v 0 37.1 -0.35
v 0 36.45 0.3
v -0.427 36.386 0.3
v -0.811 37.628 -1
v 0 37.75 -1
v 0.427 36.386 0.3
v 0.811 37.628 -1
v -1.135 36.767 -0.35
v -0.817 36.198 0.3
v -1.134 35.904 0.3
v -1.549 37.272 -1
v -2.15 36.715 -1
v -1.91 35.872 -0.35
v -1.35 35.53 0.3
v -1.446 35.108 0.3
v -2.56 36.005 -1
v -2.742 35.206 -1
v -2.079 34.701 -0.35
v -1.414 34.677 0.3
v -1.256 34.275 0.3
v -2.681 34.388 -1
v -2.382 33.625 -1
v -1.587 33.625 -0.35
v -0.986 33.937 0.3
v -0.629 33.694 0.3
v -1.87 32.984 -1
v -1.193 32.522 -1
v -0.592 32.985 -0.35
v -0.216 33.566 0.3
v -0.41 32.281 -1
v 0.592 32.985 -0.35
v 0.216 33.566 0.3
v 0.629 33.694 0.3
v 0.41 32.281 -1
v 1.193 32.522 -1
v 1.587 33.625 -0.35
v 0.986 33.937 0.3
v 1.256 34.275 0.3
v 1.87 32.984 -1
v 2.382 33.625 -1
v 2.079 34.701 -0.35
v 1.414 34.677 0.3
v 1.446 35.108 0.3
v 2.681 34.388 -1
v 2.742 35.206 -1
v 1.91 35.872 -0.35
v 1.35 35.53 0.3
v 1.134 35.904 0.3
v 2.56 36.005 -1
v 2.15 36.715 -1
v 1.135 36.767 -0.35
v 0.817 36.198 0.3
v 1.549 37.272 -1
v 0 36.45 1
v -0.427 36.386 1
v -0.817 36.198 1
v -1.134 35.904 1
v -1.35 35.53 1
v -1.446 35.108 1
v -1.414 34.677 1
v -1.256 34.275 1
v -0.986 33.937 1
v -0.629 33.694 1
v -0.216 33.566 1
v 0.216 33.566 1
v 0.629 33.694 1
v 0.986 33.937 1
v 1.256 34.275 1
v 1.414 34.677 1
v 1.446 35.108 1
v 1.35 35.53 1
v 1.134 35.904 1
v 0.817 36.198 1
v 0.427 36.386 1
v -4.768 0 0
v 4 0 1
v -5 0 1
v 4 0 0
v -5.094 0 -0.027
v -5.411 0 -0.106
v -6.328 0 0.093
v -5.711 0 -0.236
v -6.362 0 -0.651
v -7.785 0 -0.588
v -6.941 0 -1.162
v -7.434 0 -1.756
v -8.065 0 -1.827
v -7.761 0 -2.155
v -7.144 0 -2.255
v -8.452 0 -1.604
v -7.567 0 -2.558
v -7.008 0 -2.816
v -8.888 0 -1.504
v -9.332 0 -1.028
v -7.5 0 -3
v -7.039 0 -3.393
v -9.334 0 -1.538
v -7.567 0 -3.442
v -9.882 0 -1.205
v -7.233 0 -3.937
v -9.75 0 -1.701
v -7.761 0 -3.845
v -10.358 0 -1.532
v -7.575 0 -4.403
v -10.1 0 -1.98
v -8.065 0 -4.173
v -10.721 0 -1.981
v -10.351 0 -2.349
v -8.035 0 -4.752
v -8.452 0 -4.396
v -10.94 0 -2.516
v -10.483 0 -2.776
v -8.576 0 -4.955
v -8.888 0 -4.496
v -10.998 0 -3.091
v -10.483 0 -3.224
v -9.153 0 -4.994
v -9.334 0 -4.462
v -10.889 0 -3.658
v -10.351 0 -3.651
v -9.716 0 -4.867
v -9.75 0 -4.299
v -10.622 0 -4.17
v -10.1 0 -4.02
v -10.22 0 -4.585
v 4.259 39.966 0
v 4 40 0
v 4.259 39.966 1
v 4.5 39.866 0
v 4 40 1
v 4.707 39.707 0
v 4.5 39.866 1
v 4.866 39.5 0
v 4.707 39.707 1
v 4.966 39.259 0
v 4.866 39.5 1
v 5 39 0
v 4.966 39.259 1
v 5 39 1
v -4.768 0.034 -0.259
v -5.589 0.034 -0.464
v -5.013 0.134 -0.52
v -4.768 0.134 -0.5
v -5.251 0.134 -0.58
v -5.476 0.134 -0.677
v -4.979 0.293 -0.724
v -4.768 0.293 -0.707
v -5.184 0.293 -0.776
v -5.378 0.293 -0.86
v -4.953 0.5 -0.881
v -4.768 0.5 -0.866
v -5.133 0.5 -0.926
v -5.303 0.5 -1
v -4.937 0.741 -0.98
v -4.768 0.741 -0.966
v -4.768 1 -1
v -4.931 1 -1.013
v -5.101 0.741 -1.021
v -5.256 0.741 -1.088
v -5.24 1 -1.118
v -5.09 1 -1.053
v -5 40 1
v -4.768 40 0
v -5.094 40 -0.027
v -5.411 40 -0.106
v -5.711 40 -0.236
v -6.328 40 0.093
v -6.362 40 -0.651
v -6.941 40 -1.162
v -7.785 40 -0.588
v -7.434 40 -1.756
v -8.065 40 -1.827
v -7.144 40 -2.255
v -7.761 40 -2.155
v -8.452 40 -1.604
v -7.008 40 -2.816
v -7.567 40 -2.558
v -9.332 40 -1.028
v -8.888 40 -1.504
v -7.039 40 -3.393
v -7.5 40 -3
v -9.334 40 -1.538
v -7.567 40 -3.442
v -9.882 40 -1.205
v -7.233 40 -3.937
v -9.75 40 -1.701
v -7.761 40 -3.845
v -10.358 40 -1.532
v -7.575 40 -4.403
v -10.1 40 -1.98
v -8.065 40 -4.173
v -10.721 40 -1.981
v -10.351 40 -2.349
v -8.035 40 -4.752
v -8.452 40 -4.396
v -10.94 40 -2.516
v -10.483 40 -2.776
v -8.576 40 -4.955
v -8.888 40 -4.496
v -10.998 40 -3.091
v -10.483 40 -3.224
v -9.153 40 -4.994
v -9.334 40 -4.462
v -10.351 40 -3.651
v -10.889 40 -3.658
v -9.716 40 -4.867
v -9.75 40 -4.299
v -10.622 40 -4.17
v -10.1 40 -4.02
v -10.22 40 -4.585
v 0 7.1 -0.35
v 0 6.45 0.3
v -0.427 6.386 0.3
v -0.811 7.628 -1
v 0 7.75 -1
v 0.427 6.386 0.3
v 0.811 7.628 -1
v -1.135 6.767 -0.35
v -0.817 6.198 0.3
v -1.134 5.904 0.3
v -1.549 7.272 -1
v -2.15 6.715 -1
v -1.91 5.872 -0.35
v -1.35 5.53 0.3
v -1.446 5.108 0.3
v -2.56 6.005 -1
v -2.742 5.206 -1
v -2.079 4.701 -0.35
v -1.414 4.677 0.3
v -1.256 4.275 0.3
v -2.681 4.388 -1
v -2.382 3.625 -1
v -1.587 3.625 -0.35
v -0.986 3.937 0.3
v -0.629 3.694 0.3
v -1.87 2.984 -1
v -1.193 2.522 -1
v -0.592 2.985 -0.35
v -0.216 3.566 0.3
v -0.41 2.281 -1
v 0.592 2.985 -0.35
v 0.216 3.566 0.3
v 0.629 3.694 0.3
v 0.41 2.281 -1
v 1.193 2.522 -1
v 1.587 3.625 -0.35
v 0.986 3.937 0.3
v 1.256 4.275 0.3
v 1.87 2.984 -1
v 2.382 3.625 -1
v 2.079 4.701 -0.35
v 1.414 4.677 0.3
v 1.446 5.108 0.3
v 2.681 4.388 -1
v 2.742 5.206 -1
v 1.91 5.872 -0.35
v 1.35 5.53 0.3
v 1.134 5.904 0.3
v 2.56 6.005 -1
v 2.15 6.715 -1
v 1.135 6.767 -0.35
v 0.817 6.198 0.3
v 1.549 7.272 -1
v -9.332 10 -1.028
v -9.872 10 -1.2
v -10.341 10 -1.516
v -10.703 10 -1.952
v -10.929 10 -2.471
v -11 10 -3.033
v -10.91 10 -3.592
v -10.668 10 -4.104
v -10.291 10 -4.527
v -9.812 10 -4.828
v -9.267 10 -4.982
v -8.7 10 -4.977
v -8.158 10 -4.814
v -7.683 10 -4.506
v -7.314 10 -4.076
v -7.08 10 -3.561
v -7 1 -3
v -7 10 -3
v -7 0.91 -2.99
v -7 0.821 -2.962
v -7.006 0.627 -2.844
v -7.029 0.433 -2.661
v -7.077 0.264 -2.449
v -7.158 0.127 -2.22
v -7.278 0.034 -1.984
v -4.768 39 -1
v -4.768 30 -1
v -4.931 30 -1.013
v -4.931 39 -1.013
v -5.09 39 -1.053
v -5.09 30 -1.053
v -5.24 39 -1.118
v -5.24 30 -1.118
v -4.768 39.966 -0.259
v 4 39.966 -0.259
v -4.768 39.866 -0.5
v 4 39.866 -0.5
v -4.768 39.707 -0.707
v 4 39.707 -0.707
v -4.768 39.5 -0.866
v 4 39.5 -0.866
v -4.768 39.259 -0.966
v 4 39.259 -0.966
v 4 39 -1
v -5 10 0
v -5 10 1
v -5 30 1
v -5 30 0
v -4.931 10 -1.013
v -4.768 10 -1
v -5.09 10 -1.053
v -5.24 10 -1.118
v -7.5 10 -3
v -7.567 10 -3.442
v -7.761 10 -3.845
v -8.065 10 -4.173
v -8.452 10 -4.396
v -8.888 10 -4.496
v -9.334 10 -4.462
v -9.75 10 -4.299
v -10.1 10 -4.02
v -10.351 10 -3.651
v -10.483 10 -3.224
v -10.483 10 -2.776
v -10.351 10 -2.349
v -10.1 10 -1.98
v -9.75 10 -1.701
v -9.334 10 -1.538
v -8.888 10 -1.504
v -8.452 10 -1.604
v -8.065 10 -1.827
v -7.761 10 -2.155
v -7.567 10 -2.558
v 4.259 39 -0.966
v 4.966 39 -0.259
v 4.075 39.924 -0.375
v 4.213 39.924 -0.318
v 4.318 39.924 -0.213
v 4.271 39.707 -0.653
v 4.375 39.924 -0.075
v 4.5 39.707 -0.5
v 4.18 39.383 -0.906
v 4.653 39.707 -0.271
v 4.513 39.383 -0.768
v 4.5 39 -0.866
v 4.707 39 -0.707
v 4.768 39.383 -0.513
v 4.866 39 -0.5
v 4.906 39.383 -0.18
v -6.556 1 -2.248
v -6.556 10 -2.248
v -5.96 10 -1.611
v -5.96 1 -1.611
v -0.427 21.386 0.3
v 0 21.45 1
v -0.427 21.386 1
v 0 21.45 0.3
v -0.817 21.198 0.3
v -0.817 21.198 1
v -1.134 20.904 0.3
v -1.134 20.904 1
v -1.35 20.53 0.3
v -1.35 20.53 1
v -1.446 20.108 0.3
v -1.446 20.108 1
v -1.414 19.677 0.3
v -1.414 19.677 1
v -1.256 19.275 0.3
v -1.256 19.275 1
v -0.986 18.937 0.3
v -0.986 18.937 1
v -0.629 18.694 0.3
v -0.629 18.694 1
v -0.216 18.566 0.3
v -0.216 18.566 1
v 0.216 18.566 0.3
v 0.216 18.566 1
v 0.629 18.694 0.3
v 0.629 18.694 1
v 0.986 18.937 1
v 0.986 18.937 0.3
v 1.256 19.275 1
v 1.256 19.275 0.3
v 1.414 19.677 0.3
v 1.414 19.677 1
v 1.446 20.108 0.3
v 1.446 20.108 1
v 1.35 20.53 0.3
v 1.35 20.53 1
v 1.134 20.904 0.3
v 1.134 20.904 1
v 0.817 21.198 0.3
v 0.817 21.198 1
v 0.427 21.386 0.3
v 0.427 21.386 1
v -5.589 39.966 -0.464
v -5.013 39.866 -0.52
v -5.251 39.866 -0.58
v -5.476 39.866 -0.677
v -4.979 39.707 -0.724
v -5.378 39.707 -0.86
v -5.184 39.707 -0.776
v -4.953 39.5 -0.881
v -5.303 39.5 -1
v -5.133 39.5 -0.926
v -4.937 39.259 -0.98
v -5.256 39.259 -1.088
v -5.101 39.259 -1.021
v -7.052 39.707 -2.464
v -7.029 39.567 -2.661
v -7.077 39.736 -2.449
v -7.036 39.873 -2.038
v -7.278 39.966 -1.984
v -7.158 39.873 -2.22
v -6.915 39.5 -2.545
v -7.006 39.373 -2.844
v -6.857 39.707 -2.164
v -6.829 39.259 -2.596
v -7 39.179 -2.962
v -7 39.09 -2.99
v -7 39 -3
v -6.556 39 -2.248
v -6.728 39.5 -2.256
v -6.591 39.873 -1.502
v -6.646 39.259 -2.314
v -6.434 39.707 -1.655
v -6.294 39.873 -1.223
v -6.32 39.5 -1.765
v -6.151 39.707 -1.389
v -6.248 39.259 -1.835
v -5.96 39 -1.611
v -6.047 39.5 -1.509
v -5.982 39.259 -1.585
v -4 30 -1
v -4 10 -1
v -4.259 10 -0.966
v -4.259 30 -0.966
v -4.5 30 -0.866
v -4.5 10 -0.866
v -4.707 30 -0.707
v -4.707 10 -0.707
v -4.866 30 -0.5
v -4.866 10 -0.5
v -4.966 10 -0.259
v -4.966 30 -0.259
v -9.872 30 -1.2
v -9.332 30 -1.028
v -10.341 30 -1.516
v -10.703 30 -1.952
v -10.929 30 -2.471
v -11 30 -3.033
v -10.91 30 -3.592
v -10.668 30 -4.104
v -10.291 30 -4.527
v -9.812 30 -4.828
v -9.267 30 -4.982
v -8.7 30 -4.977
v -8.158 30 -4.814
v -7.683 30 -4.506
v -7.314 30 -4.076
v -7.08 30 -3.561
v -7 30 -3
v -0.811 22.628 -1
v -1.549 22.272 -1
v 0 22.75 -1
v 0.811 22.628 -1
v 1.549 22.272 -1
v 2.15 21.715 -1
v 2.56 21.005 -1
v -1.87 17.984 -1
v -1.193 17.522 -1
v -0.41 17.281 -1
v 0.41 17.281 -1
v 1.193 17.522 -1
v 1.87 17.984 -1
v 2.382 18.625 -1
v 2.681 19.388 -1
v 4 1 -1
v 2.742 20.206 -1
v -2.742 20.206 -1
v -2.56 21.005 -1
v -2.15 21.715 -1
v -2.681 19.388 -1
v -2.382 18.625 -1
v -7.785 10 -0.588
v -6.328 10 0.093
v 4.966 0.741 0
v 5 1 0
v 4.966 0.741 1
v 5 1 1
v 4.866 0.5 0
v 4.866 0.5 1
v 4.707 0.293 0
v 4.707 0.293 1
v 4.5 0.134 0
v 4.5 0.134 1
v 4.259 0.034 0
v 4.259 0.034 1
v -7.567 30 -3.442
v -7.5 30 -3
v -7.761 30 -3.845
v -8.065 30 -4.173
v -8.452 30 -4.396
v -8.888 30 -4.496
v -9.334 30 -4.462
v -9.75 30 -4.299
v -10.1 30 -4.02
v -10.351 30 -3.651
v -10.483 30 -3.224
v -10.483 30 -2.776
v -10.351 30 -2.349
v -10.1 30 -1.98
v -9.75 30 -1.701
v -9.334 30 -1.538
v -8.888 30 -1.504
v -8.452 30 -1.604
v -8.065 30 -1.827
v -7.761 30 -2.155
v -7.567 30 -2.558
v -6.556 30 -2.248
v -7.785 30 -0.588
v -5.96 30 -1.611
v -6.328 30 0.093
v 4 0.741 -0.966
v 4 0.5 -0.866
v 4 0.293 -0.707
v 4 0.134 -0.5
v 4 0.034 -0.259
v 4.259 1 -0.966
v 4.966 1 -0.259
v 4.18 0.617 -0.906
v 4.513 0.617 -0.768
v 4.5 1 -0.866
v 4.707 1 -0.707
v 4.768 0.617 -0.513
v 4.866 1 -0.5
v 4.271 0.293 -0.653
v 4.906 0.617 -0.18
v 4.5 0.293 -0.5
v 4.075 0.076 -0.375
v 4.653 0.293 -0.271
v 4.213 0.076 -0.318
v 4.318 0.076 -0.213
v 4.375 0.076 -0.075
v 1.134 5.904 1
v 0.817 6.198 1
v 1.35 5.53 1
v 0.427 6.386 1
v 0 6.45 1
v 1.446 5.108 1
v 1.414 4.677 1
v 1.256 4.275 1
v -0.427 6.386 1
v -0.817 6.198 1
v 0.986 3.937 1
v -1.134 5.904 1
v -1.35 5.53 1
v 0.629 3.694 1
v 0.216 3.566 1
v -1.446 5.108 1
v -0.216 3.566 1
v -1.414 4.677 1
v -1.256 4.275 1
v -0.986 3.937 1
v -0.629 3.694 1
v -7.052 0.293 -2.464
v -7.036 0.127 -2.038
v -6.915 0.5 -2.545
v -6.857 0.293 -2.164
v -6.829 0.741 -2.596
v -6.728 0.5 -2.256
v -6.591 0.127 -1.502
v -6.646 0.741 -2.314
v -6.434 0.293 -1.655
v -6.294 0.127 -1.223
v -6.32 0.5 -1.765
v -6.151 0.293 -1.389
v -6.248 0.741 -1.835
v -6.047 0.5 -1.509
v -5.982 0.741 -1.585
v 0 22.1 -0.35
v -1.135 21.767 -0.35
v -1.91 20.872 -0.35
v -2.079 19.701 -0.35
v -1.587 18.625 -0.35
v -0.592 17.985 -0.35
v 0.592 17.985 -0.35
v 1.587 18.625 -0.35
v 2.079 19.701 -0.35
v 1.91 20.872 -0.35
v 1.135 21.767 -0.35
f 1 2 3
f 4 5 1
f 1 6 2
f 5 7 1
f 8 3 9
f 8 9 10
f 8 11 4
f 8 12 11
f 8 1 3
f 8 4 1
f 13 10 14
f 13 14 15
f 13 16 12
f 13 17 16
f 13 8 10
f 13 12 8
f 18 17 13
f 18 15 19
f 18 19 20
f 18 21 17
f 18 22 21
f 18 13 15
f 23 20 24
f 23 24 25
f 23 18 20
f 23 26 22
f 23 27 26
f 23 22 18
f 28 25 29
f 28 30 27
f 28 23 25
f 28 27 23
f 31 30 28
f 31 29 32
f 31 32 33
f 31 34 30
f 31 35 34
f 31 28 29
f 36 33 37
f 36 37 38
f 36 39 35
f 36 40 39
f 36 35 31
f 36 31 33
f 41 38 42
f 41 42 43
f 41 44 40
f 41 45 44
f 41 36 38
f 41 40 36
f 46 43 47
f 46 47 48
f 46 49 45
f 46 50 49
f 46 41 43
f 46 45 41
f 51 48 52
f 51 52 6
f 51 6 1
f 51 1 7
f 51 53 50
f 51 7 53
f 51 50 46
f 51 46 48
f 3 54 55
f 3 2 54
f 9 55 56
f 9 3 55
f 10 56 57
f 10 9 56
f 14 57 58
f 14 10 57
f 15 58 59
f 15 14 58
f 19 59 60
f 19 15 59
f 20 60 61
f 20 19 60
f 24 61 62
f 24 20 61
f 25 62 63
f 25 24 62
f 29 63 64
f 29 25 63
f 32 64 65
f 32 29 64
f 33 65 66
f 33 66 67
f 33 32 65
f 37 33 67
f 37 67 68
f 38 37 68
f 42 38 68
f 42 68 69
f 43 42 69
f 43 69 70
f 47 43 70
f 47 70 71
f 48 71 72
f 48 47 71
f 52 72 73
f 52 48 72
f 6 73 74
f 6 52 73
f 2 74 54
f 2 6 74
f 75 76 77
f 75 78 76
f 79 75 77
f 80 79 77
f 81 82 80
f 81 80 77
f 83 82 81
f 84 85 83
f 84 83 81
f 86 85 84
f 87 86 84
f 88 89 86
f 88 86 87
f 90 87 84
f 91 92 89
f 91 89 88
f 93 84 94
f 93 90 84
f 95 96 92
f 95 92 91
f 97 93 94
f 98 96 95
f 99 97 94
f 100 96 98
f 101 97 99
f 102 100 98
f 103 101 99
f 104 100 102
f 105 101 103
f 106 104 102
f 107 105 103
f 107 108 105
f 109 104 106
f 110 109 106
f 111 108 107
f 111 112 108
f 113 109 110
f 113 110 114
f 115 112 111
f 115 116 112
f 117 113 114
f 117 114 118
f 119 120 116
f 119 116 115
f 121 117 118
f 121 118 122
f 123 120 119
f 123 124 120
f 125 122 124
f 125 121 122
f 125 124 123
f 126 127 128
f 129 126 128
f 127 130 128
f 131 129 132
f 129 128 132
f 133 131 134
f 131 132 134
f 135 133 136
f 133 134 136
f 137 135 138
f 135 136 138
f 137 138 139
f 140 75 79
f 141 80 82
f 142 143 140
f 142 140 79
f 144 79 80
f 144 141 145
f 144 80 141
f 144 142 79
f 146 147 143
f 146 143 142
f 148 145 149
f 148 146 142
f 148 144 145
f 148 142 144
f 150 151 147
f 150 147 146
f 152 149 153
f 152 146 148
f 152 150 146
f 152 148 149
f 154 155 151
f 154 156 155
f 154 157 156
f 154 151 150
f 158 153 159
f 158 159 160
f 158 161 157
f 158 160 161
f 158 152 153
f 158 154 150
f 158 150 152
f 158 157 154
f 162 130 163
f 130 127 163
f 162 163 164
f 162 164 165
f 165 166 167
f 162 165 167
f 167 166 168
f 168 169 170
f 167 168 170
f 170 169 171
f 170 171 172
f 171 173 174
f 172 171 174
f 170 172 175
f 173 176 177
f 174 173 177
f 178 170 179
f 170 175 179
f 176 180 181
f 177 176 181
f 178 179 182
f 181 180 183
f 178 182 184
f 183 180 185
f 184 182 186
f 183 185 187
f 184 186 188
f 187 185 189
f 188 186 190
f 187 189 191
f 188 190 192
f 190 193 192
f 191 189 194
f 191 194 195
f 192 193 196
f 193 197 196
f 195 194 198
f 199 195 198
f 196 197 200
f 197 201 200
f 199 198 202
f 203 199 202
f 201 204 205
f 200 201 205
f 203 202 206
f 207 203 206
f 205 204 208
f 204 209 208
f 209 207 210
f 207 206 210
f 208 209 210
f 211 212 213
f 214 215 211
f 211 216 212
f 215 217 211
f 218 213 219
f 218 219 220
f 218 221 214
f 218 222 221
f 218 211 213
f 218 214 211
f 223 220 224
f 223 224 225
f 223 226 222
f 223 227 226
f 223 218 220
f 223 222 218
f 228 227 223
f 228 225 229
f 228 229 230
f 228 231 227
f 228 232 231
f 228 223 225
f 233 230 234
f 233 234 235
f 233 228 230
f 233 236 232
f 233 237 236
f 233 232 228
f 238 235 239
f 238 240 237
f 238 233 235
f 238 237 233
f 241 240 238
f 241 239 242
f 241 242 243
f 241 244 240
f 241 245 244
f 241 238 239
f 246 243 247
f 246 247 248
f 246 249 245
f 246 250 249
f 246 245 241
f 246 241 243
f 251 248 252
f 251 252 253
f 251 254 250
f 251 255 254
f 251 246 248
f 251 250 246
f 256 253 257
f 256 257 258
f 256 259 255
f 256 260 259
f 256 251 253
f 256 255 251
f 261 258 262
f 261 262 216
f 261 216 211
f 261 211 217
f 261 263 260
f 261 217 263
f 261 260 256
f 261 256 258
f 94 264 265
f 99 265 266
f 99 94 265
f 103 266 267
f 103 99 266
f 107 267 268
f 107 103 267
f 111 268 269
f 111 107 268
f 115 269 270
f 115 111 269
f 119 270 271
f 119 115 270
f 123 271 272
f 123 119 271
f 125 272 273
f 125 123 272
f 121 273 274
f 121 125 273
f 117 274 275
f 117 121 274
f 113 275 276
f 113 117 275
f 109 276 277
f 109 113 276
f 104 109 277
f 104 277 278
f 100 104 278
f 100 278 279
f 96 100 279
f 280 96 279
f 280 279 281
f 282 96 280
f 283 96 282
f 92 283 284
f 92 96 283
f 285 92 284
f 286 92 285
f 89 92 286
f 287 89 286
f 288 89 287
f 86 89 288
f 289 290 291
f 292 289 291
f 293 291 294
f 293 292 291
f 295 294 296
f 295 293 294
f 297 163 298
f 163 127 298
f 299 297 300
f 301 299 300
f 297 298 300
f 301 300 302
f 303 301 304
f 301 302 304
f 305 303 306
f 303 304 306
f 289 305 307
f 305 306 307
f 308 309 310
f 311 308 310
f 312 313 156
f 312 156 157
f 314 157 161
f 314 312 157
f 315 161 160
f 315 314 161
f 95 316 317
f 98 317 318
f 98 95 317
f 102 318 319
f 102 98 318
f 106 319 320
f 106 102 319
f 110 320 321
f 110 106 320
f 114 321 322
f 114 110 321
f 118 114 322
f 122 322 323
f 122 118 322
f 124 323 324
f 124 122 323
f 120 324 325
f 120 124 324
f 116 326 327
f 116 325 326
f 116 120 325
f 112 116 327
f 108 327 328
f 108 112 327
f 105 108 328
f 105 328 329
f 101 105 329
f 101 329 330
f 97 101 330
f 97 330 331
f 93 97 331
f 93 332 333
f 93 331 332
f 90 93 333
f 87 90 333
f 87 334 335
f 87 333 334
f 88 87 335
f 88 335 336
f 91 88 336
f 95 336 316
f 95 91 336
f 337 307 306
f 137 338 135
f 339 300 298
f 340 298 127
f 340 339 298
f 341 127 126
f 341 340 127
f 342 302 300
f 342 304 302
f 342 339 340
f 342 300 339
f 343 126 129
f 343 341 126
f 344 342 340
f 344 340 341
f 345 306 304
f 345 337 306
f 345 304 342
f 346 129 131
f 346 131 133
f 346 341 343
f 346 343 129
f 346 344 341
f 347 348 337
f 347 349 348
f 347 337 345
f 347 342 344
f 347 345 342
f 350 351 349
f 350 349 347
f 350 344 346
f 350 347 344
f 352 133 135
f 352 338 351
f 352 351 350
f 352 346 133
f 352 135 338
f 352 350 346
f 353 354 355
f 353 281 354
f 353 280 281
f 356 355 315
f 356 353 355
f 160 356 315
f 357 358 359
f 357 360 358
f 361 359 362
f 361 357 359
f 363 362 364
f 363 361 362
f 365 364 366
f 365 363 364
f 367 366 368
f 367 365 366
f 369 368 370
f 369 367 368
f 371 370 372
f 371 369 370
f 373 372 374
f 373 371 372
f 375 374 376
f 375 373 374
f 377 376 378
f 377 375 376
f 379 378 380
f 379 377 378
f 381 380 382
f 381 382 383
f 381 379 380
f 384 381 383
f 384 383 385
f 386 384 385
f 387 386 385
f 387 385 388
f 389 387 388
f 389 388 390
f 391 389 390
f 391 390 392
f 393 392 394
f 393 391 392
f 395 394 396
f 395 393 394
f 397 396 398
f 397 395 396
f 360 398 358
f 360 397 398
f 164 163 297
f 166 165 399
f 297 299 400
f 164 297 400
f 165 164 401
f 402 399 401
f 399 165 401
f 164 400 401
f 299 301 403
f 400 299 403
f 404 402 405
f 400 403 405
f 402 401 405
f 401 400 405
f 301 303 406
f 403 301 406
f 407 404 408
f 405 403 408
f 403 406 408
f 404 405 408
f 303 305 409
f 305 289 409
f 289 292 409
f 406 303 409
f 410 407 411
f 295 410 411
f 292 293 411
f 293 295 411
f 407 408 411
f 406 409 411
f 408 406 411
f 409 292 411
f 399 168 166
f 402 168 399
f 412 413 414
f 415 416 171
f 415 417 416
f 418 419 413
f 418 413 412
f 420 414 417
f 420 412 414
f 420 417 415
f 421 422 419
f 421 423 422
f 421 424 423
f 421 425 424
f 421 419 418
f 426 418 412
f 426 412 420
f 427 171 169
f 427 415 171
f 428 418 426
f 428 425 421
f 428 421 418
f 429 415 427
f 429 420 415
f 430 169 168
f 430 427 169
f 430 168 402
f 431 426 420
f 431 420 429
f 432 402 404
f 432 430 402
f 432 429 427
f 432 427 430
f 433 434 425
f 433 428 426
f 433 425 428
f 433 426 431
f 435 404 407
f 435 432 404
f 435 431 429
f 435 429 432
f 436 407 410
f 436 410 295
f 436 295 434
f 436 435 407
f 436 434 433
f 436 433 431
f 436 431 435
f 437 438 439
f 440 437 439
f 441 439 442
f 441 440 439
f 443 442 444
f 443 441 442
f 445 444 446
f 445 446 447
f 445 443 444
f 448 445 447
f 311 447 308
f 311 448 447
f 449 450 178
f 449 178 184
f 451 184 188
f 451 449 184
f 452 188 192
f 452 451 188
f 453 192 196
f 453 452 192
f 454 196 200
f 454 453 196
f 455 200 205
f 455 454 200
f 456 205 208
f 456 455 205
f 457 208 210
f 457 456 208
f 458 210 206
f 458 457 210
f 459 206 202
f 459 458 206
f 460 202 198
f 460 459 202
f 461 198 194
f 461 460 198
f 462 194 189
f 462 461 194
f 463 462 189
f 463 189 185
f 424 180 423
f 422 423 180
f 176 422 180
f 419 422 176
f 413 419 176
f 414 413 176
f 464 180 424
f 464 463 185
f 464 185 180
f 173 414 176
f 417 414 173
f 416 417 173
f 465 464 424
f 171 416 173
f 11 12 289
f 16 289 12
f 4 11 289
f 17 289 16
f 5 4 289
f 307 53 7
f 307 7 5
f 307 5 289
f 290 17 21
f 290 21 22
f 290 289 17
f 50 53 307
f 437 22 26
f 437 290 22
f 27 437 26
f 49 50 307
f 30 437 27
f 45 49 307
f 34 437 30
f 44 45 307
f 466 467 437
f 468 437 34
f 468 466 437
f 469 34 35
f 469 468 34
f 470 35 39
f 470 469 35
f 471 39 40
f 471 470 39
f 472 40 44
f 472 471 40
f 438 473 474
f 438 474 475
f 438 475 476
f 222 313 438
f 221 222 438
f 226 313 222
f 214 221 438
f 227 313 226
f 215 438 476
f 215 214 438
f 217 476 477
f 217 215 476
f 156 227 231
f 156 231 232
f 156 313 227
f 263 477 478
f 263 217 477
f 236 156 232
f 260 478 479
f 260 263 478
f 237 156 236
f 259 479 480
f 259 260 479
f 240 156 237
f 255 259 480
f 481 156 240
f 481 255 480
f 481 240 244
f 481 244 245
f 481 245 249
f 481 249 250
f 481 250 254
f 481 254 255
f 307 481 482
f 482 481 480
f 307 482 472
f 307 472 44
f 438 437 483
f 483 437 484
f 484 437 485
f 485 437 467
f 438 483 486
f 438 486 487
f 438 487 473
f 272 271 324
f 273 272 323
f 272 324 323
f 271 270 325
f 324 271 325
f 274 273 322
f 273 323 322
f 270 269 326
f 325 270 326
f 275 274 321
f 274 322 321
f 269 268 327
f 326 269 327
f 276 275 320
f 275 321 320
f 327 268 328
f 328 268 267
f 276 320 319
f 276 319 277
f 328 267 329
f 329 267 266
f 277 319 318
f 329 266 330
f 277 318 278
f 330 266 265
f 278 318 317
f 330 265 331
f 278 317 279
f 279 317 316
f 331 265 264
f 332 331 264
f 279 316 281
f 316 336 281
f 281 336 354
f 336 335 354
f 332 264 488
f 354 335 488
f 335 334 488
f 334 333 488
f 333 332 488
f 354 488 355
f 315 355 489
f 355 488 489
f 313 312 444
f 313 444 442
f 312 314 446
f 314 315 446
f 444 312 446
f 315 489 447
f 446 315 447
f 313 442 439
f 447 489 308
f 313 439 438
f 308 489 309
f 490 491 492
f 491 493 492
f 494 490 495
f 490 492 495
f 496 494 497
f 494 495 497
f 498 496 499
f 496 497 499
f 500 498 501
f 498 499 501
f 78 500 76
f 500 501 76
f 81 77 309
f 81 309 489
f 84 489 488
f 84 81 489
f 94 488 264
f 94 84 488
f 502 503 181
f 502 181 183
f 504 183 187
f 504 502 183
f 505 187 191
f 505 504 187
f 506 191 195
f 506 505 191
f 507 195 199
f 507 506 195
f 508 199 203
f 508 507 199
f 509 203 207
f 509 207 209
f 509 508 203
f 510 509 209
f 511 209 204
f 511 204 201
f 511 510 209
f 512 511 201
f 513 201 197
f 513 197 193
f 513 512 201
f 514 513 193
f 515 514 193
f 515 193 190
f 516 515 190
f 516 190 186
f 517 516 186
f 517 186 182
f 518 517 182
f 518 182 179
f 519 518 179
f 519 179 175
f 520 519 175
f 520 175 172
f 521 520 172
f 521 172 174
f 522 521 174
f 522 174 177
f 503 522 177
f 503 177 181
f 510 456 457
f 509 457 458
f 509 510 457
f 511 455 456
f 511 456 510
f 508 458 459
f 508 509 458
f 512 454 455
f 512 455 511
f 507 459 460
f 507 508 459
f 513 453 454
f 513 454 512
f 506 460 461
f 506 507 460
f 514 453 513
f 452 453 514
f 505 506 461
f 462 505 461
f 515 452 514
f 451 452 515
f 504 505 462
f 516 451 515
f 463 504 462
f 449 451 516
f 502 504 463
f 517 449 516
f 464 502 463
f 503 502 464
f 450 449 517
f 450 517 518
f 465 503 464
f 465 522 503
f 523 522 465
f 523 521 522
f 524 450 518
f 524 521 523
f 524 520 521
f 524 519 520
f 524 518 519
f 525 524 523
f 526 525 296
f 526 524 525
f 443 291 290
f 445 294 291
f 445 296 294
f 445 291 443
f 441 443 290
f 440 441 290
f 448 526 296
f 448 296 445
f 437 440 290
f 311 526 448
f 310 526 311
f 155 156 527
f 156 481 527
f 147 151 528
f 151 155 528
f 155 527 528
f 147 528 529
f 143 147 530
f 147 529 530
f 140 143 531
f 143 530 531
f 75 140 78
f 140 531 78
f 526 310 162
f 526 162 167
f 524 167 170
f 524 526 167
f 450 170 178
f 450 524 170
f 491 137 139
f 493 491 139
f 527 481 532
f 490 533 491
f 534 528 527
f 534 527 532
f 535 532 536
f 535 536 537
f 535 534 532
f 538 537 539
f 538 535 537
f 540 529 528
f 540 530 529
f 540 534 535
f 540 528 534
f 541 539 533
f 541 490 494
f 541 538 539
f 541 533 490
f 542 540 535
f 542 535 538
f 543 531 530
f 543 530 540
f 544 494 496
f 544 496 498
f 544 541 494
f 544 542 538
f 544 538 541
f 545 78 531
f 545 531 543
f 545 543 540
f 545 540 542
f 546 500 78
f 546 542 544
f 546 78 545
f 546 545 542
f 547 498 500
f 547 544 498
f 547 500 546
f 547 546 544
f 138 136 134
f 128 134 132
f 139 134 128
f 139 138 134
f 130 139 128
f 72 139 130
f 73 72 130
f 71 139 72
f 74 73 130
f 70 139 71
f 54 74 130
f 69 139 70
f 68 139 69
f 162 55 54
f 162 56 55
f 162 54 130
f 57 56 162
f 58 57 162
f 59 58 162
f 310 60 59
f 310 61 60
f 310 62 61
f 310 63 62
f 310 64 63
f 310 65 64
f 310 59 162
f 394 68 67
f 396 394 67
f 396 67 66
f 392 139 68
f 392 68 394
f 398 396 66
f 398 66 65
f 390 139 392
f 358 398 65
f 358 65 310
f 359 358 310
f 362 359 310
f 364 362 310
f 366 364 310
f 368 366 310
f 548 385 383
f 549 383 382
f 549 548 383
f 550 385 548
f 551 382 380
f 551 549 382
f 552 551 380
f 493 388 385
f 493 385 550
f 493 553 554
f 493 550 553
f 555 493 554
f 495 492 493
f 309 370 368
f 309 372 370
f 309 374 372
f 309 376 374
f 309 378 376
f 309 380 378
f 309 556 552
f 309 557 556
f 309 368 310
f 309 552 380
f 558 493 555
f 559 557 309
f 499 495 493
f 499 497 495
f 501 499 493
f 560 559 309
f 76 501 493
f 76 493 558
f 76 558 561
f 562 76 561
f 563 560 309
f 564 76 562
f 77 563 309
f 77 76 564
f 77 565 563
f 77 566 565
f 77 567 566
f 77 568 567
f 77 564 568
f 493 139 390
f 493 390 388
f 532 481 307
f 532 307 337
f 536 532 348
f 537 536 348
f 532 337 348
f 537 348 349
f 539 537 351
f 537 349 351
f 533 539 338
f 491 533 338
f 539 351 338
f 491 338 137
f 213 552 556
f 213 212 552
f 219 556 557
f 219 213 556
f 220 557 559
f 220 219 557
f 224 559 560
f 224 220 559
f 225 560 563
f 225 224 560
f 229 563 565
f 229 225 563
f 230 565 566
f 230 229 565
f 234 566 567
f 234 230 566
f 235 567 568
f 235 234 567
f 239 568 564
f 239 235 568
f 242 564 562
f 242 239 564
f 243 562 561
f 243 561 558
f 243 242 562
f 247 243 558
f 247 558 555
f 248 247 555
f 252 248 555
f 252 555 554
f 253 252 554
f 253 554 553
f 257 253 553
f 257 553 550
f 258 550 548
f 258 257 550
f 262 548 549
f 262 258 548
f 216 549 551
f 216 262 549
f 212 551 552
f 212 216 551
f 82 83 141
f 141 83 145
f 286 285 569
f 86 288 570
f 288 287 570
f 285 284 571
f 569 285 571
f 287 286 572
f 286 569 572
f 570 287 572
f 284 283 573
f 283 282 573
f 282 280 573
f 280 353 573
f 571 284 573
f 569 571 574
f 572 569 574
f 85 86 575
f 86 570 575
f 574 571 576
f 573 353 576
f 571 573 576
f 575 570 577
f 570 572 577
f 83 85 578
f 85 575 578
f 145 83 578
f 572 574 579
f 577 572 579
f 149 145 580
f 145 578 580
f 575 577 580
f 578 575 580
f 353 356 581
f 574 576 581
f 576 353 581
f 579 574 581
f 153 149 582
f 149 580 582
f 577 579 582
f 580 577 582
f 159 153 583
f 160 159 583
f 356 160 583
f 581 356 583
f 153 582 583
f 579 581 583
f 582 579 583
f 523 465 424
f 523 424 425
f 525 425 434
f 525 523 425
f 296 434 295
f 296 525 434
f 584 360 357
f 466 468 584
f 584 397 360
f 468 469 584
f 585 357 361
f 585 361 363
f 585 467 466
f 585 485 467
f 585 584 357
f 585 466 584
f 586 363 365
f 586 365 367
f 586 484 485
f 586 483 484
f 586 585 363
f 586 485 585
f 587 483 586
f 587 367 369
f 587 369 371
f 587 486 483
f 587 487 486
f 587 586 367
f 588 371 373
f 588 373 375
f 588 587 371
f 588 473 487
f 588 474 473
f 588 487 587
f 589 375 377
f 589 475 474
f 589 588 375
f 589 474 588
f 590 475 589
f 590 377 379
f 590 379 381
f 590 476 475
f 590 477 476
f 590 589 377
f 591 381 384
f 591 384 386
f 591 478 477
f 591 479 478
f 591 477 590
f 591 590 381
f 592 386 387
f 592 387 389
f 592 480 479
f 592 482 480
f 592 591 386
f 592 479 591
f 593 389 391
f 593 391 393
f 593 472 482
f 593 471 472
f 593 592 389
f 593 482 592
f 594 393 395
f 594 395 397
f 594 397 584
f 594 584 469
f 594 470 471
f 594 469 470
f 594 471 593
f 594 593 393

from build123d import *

# Parameters (mm, degrees)
SKETCH3_R                                    = 1.5
BOSS_EXTRUDE2_DEPTH                          = 40
SKETCH4_W                                    = 6
SKETCH4_H                                    = 20
CUT_EXTRUDE1_DEPTH                           = 40
CUT_EXTRUDE1_DEPTH_BACK                      = 200
FILLET1_R                                    = 1
FILLET2_R                                    = 1
CSK_FOR_M2_5_COUNTERSUNK_FLAT_HEAD_S_2_COUNT = 2
CSK_FOR_M2_5_COUNTERSUNK_FLAT_HEAD_S_2_PITCH = 15
CSK_FOR_M2_5_COUNTERSUNK_FLAT_HEAD_S_3_COUNT = 2
CSK_FOR_M2_5_COUNTERSUNK_FLAT_HEAD_S_3_PITCH = 30


with BuildPart() as part:
    # Sketch3 → Boss-Extrude2 (new body)
    with BuildSketch(Plane(origin=(0, 0, 0), x_dir=(1, 0, 0), z_dir=(0, 1, 0))):
        with BuildLine():
            Line((-5, 1), (5, 1))
            Line((5, 1), (5, -1))
            Line((5, -1), (-5, -1))
            ThreePointArc((-5, -1), (-7.043086083, 0.276738431), (-9.332231573, 1.027787491))
            ThreePointArc((-9.332231573, 1.027787491), (-10.291421088, 4.527164553), (-7, 3))
            ThreePointArc((-7, 3), (-6.182675814, 1.817324186), (-5, 1))
        make_face()
        with Locations((-9, 3)):
            Circle(SKETCH3_R, mode=Mode.SUBTRACT)
    extrude(amount=BOSS_EXTRUDE2_DEPTH)

    # Sketch4 → Cut-Extrude1 (cut, two sides)
    with BuildSketch(Plane.XY) as cut_extrude1_sk:
        with Locations((-8, 20)):
            Rectangle(SKETCH4_W, SKETCH4_H)
    extrude(amount=CUT_EXTRUDE1_DEPTH, mode=Mode.SUBTRACT)
    extrude(cut_extrude1_sk.sketch, amount=-CUT_EXTRUDE1_DEPTH_BACK, mode=Mode.SUBTRACT)

    # Fillet1
    fillet1_edges = [part.edges().sort_by_distance(p)[0] for p in [
        (5, 20, -1),
        (-5, 20, -1),
    ]]
    fillet(fillet1_edges, radius=FILLET1_R)

    # Fillet2
    fillet2_edges = [part.edges().sort_by_distance(p)[0] for p in [
        (-6.182675814, 40, -1.817324186),
        (-5, 35, -1),
        (-5, 5, -1),
        (5, 40, 0.5),
        (-0.5, 0, -1),
        (-0.5, 40, -1),
        (4.707106781, 0, -0.707106781),
        (4.707106781, 40, -0.707106781),
        (-6.182675814, 0, -1.817324186),
        (5, 0, 0.5),
    ]]
    fillet(fillet2_edges, radius=FILLET2_R)

    # Sketch6 → CSK for M2.5 Countersunk Flat Head Screw1 (revolve, cut)
    with BuildSketch(Plane(origin=(0, 35, -1), x_dir=(0, 1, 0), z_dir=(1, 0, 0))):
        Polygon((0, 0), (0, 2), (1.45, 2), (1.45, 1.3), (2.75, 0), align=None)
    csk_for_m2_5_countersunk_flat_head_screw = revolve(axis=Axis((0, 35, -7.35), (0, 0, 1)), mode=Mode.SUBTRACT)

    # CSK for M2.5 Countersunk Flat Head S 2: CSK for M2.5 Countersunk Flat Head Screw1 ×2
    with Locations(*[(0, -i * CSK_FOR_M2_5_COUNTERSUNK_FLAT_HEAD_S_2_PITCH, 0) for i in range(1, CSK_FOR_M2_5_COUNTERSUNK_FLAT_HEAD_S_2_COUNT)]):
        add(csk_for_m2_5_countersunk_flat_head_screw, mode=Mode.SUBTRACT)

    # CSK for M2.5 Countersunk Flat Head S 3: CSK for M2.5 Countersunk Flat Head Screw1 ×2
    with Locations(*[(0, -i * CSK_FOR_M2_5_COUNTERSUNK_FLAT_HEAD_S_3_PITCH, 0) for i in range(1, CSK_FOR_M2_5_COUNTERSUNK_FLAT_HEAD_S_3_COUNT)]):
        add(csk_for_m2_5_countersunk_flat_head_screw, mode=Mode.SUBTRACT)


solid = part.part
